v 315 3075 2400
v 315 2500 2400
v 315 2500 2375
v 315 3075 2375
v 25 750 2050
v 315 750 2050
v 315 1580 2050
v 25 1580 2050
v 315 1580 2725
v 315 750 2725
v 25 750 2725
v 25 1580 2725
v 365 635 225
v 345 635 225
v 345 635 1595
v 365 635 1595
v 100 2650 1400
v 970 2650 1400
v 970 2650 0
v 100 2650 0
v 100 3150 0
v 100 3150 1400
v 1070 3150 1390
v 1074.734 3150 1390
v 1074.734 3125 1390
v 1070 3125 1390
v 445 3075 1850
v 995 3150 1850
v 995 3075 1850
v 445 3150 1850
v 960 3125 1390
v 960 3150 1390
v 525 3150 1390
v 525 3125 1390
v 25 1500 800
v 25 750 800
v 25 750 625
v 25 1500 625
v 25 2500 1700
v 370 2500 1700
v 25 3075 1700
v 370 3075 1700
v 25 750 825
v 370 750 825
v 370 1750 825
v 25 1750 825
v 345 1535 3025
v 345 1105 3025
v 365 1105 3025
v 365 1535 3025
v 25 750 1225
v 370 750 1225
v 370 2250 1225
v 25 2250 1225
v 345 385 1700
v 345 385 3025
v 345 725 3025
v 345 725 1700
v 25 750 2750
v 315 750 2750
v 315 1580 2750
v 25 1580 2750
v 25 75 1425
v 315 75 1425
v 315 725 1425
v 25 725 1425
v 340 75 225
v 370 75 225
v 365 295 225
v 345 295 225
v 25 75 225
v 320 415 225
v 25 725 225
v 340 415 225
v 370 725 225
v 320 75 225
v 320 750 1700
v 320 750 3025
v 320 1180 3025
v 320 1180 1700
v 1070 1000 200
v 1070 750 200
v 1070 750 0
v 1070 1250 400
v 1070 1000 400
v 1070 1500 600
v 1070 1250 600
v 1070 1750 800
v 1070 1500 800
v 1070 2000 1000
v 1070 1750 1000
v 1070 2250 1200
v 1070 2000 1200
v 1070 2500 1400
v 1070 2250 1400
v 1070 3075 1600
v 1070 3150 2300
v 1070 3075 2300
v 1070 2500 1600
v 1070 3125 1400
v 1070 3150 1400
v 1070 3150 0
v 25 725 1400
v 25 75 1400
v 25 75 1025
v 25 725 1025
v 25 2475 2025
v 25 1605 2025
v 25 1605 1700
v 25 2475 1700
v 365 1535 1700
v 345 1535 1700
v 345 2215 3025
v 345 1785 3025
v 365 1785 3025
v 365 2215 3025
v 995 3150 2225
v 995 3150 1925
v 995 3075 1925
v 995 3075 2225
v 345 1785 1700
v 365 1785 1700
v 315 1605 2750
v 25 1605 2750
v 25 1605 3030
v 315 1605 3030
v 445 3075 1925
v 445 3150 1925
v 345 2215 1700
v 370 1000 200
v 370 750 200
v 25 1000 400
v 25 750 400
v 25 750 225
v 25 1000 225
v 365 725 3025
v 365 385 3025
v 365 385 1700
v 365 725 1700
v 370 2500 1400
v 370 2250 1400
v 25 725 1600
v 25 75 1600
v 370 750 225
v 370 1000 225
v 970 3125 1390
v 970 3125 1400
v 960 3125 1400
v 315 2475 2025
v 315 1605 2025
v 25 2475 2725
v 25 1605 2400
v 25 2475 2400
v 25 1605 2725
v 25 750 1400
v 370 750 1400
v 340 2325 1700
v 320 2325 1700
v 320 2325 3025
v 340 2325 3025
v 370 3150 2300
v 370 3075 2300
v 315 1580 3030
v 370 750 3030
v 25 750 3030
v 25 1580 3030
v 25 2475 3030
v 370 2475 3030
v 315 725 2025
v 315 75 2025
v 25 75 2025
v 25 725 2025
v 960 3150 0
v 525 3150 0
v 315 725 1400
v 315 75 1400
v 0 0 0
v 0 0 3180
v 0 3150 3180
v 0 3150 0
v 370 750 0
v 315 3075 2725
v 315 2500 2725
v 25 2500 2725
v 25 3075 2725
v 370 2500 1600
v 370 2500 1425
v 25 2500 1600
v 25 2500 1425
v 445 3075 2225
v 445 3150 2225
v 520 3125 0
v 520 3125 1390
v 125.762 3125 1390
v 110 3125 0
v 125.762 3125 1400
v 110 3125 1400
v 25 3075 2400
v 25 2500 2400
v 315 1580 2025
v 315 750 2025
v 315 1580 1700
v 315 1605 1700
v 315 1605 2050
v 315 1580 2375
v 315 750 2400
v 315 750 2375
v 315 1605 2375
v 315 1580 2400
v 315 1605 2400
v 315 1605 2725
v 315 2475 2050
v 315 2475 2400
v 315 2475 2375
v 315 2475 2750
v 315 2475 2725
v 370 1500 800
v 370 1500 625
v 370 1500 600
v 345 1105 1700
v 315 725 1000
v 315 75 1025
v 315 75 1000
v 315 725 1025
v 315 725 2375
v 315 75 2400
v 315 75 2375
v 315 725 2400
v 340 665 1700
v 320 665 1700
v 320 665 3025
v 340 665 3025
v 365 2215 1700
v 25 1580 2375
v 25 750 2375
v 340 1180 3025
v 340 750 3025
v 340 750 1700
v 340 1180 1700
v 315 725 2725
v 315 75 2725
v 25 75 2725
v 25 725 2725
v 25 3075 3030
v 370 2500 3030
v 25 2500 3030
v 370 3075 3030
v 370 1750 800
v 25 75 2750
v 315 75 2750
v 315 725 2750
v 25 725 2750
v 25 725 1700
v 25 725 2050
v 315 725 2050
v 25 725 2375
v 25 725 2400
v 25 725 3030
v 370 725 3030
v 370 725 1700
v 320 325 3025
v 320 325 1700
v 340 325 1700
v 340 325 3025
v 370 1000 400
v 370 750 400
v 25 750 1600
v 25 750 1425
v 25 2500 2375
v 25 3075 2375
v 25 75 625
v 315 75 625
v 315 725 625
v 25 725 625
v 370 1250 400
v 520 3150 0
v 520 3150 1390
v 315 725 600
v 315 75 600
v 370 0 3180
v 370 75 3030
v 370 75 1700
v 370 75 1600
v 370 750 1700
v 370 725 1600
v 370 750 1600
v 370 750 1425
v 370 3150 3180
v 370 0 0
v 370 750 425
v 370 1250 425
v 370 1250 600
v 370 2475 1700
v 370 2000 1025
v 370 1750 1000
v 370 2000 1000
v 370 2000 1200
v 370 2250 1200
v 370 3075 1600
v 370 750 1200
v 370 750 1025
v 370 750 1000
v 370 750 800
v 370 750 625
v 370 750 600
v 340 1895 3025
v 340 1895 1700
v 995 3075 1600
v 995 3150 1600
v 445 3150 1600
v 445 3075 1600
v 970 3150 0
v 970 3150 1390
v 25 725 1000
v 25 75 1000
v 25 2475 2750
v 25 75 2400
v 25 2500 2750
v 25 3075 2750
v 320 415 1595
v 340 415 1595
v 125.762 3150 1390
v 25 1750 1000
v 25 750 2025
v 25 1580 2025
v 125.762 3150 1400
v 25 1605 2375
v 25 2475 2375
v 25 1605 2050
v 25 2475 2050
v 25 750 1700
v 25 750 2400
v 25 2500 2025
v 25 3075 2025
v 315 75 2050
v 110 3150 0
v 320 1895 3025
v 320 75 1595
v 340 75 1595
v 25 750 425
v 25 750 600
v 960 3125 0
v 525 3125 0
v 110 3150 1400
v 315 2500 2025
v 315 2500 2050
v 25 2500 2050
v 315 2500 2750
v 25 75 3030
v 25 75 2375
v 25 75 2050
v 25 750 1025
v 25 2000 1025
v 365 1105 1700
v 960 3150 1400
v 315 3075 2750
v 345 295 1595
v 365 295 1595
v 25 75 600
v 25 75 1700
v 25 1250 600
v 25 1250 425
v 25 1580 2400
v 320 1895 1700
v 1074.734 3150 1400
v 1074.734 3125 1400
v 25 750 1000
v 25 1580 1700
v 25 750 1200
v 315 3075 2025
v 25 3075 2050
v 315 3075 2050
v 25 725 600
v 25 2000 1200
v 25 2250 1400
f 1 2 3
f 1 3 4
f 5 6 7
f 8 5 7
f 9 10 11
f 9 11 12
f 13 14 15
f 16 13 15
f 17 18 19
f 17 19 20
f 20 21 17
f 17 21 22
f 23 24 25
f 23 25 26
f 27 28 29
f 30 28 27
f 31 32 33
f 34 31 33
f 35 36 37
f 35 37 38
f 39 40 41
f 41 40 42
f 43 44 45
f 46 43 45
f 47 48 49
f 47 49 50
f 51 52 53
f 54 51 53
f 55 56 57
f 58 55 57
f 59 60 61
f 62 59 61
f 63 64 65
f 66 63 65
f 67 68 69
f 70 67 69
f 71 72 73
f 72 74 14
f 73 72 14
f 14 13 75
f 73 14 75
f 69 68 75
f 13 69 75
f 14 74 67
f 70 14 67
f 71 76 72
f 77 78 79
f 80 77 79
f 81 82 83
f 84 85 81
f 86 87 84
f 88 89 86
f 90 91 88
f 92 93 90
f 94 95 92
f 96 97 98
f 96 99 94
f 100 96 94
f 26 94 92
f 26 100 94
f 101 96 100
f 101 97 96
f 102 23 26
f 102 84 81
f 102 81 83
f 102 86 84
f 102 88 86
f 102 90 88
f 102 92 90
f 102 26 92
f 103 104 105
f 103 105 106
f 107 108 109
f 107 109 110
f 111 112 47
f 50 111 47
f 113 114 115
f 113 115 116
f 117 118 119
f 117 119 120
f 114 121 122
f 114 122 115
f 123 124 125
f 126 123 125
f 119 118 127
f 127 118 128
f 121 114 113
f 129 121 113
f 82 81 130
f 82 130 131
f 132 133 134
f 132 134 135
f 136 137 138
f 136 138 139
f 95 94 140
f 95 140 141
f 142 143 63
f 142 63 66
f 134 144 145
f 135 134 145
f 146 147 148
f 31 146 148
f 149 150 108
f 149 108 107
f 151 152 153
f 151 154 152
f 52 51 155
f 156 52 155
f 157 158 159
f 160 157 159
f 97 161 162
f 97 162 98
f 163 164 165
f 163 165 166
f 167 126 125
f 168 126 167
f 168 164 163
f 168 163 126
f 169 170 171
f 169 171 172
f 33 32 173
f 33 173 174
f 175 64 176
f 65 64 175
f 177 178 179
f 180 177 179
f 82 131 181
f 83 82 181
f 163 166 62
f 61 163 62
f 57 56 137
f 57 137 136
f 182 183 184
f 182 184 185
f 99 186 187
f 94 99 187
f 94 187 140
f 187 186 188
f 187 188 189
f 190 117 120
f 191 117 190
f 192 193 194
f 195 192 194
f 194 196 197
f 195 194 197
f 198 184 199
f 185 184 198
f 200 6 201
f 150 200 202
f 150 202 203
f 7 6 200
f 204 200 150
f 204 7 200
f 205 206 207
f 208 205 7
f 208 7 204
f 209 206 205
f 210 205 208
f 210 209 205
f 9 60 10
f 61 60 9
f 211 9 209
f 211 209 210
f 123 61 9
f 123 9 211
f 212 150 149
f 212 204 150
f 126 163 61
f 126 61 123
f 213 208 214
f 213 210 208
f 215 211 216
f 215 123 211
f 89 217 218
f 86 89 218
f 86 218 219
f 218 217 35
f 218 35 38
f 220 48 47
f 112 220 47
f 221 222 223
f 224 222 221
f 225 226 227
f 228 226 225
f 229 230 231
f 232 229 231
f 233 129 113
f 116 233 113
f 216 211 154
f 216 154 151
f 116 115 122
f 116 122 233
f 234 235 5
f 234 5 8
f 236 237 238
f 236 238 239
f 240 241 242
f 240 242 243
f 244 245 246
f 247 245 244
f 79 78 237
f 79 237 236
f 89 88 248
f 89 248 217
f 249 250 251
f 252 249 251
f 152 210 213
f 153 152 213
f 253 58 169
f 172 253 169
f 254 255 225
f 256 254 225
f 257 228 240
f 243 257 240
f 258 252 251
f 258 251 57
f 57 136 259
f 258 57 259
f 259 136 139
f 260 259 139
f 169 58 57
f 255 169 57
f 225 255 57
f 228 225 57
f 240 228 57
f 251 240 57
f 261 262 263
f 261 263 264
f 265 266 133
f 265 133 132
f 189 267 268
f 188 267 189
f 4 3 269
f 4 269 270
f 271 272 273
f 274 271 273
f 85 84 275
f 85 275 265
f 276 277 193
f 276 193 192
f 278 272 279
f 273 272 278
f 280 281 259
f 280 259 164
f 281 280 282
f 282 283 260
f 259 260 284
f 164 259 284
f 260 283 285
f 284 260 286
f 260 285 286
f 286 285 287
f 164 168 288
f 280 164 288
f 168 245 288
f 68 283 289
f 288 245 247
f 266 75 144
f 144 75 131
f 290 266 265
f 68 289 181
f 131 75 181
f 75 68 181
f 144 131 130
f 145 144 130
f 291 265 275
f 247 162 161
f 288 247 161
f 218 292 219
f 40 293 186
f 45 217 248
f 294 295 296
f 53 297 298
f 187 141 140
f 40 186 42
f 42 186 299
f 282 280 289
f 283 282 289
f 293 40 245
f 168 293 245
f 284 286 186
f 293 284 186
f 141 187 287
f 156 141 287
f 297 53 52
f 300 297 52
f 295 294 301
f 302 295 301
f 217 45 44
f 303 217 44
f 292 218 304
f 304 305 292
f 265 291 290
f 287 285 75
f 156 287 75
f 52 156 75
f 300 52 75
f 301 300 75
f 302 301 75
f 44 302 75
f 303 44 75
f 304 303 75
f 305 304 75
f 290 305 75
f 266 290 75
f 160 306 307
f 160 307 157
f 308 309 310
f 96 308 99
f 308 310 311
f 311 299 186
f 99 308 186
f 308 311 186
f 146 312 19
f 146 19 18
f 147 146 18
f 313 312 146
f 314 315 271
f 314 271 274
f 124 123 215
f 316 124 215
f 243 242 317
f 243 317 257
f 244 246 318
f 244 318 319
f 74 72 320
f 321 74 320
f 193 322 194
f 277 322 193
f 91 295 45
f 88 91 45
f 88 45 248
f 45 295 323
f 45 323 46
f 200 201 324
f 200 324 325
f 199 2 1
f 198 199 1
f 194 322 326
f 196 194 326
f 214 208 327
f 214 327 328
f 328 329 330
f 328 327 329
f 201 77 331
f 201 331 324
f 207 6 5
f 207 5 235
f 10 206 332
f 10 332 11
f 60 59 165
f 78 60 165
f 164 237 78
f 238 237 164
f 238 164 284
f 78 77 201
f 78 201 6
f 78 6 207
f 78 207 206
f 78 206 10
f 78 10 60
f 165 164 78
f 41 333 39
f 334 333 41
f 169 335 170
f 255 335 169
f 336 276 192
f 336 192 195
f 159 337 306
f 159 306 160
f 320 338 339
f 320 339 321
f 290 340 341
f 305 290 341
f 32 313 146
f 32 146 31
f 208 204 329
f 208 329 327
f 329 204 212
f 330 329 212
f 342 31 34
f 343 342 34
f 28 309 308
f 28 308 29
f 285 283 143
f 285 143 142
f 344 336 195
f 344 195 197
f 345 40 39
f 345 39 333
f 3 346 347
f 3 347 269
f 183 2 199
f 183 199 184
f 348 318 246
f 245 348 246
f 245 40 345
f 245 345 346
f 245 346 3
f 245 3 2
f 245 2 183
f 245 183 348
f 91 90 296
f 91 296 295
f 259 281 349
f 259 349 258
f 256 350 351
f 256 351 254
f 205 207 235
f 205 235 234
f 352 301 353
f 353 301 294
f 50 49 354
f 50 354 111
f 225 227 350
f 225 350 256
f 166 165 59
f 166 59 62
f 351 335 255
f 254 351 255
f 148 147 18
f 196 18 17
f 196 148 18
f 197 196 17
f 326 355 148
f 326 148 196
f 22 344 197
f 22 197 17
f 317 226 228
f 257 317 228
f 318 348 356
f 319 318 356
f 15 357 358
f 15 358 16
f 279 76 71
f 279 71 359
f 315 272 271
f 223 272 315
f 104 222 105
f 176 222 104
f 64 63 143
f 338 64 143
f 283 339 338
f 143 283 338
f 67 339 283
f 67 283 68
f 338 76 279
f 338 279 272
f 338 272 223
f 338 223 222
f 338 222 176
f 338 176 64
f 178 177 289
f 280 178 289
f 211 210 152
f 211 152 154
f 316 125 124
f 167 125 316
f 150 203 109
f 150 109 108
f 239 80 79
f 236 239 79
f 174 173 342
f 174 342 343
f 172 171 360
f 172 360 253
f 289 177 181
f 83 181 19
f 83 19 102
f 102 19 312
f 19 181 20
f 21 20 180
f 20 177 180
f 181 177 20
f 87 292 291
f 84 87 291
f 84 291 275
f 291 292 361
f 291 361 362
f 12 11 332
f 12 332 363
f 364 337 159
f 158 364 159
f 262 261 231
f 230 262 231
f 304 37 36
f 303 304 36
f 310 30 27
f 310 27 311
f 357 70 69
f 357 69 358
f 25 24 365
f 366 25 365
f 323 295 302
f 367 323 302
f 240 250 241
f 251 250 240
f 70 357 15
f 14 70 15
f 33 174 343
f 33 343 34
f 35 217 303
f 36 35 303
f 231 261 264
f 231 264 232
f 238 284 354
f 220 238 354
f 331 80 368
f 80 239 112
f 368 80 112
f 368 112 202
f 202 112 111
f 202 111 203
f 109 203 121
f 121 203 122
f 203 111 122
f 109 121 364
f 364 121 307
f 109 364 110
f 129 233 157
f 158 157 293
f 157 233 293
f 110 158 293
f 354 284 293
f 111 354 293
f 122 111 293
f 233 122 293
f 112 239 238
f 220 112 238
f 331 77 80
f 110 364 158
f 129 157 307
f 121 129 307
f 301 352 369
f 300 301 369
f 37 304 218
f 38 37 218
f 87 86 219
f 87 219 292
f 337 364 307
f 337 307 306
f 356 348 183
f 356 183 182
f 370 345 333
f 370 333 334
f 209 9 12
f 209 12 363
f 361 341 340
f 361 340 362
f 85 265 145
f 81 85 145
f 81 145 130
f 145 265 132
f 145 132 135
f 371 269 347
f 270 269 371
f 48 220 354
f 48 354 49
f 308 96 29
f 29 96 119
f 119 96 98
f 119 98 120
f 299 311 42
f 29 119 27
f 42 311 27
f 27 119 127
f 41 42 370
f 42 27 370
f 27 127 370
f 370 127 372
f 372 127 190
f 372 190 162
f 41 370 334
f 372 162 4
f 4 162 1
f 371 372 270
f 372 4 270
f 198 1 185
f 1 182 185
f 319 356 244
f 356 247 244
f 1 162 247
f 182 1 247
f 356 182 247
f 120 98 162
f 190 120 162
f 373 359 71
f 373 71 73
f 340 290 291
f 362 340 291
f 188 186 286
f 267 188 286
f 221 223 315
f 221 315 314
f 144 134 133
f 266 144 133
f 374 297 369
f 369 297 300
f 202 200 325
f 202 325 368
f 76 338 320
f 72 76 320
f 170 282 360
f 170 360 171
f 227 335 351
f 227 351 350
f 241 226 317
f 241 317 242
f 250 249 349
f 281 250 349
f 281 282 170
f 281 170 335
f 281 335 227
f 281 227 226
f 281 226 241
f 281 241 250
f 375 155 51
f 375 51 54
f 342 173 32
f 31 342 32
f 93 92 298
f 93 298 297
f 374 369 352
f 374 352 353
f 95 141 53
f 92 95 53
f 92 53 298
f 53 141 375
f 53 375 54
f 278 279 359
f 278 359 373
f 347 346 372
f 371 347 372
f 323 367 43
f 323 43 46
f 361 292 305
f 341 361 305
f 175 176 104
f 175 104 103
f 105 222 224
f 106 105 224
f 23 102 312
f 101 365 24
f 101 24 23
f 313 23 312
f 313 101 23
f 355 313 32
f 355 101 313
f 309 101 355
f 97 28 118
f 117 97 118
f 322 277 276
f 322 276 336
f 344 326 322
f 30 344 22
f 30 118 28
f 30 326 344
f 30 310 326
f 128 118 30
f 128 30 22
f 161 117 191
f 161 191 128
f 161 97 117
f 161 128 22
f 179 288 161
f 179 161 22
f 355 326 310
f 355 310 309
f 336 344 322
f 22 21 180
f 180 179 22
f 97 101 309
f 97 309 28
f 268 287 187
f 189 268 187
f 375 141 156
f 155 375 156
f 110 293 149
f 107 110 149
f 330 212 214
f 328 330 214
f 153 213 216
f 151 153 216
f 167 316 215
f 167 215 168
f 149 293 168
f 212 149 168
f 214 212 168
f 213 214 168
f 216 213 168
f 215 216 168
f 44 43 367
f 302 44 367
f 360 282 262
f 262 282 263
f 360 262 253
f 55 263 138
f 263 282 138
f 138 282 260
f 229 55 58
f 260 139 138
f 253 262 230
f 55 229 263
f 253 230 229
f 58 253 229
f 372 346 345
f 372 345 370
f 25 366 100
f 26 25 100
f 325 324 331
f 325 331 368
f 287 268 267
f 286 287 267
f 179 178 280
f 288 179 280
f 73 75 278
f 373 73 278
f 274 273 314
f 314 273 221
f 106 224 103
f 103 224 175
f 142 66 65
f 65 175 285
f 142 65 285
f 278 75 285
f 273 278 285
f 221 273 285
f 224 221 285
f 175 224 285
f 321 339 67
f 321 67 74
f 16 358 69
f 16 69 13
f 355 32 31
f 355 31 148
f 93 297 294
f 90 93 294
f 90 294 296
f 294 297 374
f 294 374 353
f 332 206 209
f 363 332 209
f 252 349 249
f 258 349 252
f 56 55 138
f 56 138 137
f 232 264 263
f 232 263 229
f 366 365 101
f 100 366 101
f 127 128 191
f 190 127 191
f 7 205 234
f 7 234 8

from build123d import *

# Parameters (mm, degrees)
F0_W      = 370
F0_H      = 3150
F1_DEPTH  = 3180
F3_DEPTH  = 700
F5_W      = 250
F5_H      = 175
F6_DEPTH  = 345
F7_W      = 650
F7_H      = 375
F7_H_2    = 175
F8_DEPTH  = 345
F10_W     = 650
F10_H     = 825
F11_DEPTH = 55
F9_W      = 575
F9_H      = 1330
F9_W_2    = 650
F9_W_3    = 1725
F12_DEPTH = 345
F13_W     = 1505
F13_H     = 25
F13_W_2   = 1470
F14_DEPTH = 290
F17_W     = 340
F17_H     = 1370
F17_H_2   = 1325
F17_W_2   = 430
F18_DEPTH = 20
F19_W     = 340
F19_H     = 1370
F19_H_2   = 1325
F19_W_2   = 430
F20_DEPTH = 20
F21_W     = 550
F21_H     = 300
F22_DEPTH = 75
F23_W     = 870
F23_H     = 1400
F24_DEPTH = 500
F25_W     = 435
F25_H     = 1390
F26_DEPTH = 25
F25_W_2   = 15.761821866
F25_H_2   = 10
F25_W_3   = 114.7337341309


with BuildPart() as f1:
    # F0 (on Top) → F1 (new body)
    with BuildSketch(Plane.XY):
        with Locations((185, 1575)):
            Rectangle(F0_W, F0_H)
    extrude(amount=F1_DEPTH)

    # F2 (on face) → F3 (join)
    with BuildSketch(Plane.YZ.offset(370)):
        Polygon((750, 0), (3150, 0), (3150, 1600), (2750, 1600), (2500, 1600), (2500, 1400), (2250, 1400), (2250, 1200), (2000, 1200), (2000, 1000), (1750, 1000), (1750, 800), (1500, 800), (1500, 600), (1250, 600), (1250, 400), (1000, 400), (1000, 200), (750, 200), align=None)
    extrude(amount=F3_DEPTH)

    # F5 (on face) → F6 (cut, through all)
    with BuildSketch(Plane.YZ.offset(370)):
        with Locations((875, 312.5)):
            Rectangle(F5_W, F5_H)
        with Locations((1125, 512.5)):
            Rectangle(F5_W, F5_H)
        with Locations((875, 512.5)):
            Rectangle(F5_W, F5_H)
        with Locations((1125, 712.5)):
            Rectangle(F5_W, F5_H)
        with Locations((875, 712.5)):
            Rectangle(F5_W, F5_H)
        with Locations((1375, 712.5)):
            Rectangle(F5_W, F5_H)
        with Locations((1125, 912.5)):
            Rectangle(F5_W, F5_H)
        with Locations((875, 912.5)):
            Rectangle(F5_W, F5_H)
        with Locations((1375, 912.5)):
            Rectangle(F5_W, F5_H)
        with Locations((1625, 912.5)):
            Rectangle(F5_W, F5_H)
        with Locations((1125, 1112.5)):
            Rectangle(F5_W, F5_H)
        with Locations((875, 1112.5)):
            Rectangle(F5_W, F5_H)
        with Locations((1375, 1112.5)):
            Rectangle(F5_W, F5_H)
        with Locations((1625, 1112.5)):
            Rectangle(F5_W, F5_H)
        with Locations((1875, 1112.5)):
            Rectangle(F5_W, F5_H)
        with Locations((1125, 1312.5)):
            Rectangle(F5_W, F5_H)
        with Locations((875, 1312.5)):
            Rectangle(F5_W, F5_H)
        with Locations((1375, 1312.5)):
            Rectangle(F5_W, F5_H)
        with Locations((1625, 1312.5)):
            Rectangle(F5_W, F5_H)
        with Locations((1875, 1312.5)):
            Rectangle(F5_W, F5_H)
        with Locations((2125, 1312.5)):
            Rectangle(F5_W, F5_H)
        with Locations((1125, 1512.5)):
            Rectangle(F5_W, F5_H)
        with Locations((875, 1512.5)):
            Rectangle(F5_W, F5_H)
        with Locations((1375, 1512.5)):
            Rectangle(F5_W, F5_H)
        with Locations((1625, 1512.5)):
            Rectangle(F5_W, F5_H)
        with Locations((1875, 1512.5)):
            Rectangle(F5_W, F5_H)
        with Locations((2125, 1512.5)):
            Rectangle(F5_W, F5_H)
        with Locations((2375, 1512.5)):
            Rectangle(F5_W, F5_H)
    extrude(amount=-F6_DEPTH, mode=Mode.SUBTRACT)

    # F7 (on face) → F8 (cut, through all)
    with BuildSketch(Plane.YZ.offset(370)):
        with Locations((400, 412.5)):
            Rectangle(F7_W, F7_H)
        with Locations((400, 812.5)):
            Rectangle(F7_W, F7_H)
        with Locations((400, 1212.5)):
            Rectangle(F7_W, F7_H)
        with Locations((400, 1512.5)):
            Rectangle(F7_W, F7_H_2)
    extrude(amount=-F8_DEPTH, mode=Mode.SUBTRACT)

    # F10 (on face) → F11 (cut)
    with BuildSketch(Plane.YZ.offset(370)):
        with Locations((400, 1012.5)):
            Rectangle(F10_W, F10_H)
    extrude(amount=-F11_DEPTH, mode=Mode.SUBTRACT)

    # F9 (on face) → F12 (cut, through all)
    with BuildSketch(Plane.YZ.offset(370)):
        with Locations((2787.5, 2365)):
            Rectangle(F9_W, F9_H)
        with Locations((400, 2365)):
            Rectangle(F9_W_2, F9_H)
        with Locations((1612.5, 2365)):
            Rectangle(F9_W_3, F9_H)
    extrude(amount=-F12_DEPTH, mode=Mode.SUBTRACT)

    # F13 (on face) → F14 (join, through all)
    with BuildSketch(Plane.YZ.offset(315)):
        with Locations((827.5, 2037.5)):
            Rectangle(F13_W, F13_H)
        Polygon((1580, 2050), (1580, 2025), (1580, 1700), (1605, 1700), (1605, 2025), (1605, 2050), (1605, 2375), (1605, 2400), (1605, 2725), (1605, 2750), (1605, 3030), (1580, 3030), (1580, 2750), (1580, 2725), (1580, 2400), (1580, 2375), align=None)
        with Locations((827.5, 2387.5)):
            Rectangle(F13_W, F13_H)
        with Locations((2340, 2037.5)):
            Rectangle(F13_W_2, F13_H)
        with Locations((827.5, 2737.5)):
            Rectangle(F13_W, F13_H)
        with Locations((2340, 2387.5)):
            Rectangle(F13_W_2, F13_H)
        with Locations((2340, 2737.5)):
            Rectangle(F13_W_2, F13_H)
    extrude(amount=-F14_DEPTH)

    # F17 (on offset) → F18 (join)
    with BuildSketch(Plane.YZ.offset(320)):
        with Locations((245, 910)):
            Rectangle(F17_W, F17_H)
        with Locations((495, 2362.5)):
            Rectangle(F17_W, F17_H_2)
        with Locations((965, 2362.5)):
            Rectangle(F17_W_2, F17_H_2)
        with Locations((2110, 2362.5)):
            Rectangle(F17_W_2, F17_H_2)
    extrude(amount=F18_DEPTH)

    # F19 (on offset) → F20 (join)
    with BuildSketch(Plane.YZ.offset(345)):
        with Locations((465, 910)):
            Rectangle(F19_W, F19_H)
        with Locations((555, 2362.5)):
            Rectangle(F19_W, F19_H_2)
        with Locations((1320, 2362.5)):
            Rectangle(F19_W_2, F19_H_2)
        with Locations((2000, 2362.5)):
            Rectangle(F19_W_2, F19_H_2)
    extrude(amount=F20_DEPTH)

    # F21 (on face) → F22 (join, through all)
    with BuildSketch(Plane(origin=(0, 3150, 0), x_dir=(-1, 0, 0), z_dir=(0, 1, 0))):
        Polygon((-1070, 2300), (-1070, 1600), (-995, 1600), (-995, 1850), (-445, 1850), (-445, 1600), (-370, 1600), (-370, 2300), align=None)
        with Locations((-720, 2075)):
            Rectangle(F21_W, F21_H, mode=Mode.SUBTRACT)
    extrude(amount=-F22_DEPTH)

    # F23 (on face) → F24 (cut)
    with BuildSketch(Plane(origin=(0, 3150, 0), x_dir=(-1, 0, 0), z_dir=(0, 1, 0))):
        with Locations((-535, 700)):
            Rectangle(F23_W, F23_H)
    extrude(amount=-F24_DEPTH, mode=Mode.SUBTRACT)



with BuildPart() as f26:
    # F25 (on face) → F26 (new body)
    with BuildSketch(Plane(origin=(0, 3150, 0), x_dir=(-1, 0, 0), z_dir=(0, 1, 0))):
        with Locations((-742.5, 695)):
            Rectangle(F25_W, F25_H)
    extrude(amount=-F26_DEPTH)


with BuildPart() as f1_1:
    add(f1.part)

    add(f26.part)  # F26#2 merges F26
    # F25 (on face) → F26, piece 2 (join)
    with BuildSketch(Plane(origin=(0, 3150, 0), x_dir=(-1, 0, 0), z_dir=(0, 1, 0))):
        Polygon((-520, 1390), (-520, 0), (-110, 0), (-110, 1390), (-125.761821866, 1390), align=None)
        with Locations((-117.880910933, 1395)):
            Rectangle(F25_W_2, F25_H_2)
        with Locations((-1017.3668670654, 1395)):
            Rectangle(F25_W_3, F25_H_2)
    extrude(amount=-F26_DEPTH)


solid = f1_1.part
